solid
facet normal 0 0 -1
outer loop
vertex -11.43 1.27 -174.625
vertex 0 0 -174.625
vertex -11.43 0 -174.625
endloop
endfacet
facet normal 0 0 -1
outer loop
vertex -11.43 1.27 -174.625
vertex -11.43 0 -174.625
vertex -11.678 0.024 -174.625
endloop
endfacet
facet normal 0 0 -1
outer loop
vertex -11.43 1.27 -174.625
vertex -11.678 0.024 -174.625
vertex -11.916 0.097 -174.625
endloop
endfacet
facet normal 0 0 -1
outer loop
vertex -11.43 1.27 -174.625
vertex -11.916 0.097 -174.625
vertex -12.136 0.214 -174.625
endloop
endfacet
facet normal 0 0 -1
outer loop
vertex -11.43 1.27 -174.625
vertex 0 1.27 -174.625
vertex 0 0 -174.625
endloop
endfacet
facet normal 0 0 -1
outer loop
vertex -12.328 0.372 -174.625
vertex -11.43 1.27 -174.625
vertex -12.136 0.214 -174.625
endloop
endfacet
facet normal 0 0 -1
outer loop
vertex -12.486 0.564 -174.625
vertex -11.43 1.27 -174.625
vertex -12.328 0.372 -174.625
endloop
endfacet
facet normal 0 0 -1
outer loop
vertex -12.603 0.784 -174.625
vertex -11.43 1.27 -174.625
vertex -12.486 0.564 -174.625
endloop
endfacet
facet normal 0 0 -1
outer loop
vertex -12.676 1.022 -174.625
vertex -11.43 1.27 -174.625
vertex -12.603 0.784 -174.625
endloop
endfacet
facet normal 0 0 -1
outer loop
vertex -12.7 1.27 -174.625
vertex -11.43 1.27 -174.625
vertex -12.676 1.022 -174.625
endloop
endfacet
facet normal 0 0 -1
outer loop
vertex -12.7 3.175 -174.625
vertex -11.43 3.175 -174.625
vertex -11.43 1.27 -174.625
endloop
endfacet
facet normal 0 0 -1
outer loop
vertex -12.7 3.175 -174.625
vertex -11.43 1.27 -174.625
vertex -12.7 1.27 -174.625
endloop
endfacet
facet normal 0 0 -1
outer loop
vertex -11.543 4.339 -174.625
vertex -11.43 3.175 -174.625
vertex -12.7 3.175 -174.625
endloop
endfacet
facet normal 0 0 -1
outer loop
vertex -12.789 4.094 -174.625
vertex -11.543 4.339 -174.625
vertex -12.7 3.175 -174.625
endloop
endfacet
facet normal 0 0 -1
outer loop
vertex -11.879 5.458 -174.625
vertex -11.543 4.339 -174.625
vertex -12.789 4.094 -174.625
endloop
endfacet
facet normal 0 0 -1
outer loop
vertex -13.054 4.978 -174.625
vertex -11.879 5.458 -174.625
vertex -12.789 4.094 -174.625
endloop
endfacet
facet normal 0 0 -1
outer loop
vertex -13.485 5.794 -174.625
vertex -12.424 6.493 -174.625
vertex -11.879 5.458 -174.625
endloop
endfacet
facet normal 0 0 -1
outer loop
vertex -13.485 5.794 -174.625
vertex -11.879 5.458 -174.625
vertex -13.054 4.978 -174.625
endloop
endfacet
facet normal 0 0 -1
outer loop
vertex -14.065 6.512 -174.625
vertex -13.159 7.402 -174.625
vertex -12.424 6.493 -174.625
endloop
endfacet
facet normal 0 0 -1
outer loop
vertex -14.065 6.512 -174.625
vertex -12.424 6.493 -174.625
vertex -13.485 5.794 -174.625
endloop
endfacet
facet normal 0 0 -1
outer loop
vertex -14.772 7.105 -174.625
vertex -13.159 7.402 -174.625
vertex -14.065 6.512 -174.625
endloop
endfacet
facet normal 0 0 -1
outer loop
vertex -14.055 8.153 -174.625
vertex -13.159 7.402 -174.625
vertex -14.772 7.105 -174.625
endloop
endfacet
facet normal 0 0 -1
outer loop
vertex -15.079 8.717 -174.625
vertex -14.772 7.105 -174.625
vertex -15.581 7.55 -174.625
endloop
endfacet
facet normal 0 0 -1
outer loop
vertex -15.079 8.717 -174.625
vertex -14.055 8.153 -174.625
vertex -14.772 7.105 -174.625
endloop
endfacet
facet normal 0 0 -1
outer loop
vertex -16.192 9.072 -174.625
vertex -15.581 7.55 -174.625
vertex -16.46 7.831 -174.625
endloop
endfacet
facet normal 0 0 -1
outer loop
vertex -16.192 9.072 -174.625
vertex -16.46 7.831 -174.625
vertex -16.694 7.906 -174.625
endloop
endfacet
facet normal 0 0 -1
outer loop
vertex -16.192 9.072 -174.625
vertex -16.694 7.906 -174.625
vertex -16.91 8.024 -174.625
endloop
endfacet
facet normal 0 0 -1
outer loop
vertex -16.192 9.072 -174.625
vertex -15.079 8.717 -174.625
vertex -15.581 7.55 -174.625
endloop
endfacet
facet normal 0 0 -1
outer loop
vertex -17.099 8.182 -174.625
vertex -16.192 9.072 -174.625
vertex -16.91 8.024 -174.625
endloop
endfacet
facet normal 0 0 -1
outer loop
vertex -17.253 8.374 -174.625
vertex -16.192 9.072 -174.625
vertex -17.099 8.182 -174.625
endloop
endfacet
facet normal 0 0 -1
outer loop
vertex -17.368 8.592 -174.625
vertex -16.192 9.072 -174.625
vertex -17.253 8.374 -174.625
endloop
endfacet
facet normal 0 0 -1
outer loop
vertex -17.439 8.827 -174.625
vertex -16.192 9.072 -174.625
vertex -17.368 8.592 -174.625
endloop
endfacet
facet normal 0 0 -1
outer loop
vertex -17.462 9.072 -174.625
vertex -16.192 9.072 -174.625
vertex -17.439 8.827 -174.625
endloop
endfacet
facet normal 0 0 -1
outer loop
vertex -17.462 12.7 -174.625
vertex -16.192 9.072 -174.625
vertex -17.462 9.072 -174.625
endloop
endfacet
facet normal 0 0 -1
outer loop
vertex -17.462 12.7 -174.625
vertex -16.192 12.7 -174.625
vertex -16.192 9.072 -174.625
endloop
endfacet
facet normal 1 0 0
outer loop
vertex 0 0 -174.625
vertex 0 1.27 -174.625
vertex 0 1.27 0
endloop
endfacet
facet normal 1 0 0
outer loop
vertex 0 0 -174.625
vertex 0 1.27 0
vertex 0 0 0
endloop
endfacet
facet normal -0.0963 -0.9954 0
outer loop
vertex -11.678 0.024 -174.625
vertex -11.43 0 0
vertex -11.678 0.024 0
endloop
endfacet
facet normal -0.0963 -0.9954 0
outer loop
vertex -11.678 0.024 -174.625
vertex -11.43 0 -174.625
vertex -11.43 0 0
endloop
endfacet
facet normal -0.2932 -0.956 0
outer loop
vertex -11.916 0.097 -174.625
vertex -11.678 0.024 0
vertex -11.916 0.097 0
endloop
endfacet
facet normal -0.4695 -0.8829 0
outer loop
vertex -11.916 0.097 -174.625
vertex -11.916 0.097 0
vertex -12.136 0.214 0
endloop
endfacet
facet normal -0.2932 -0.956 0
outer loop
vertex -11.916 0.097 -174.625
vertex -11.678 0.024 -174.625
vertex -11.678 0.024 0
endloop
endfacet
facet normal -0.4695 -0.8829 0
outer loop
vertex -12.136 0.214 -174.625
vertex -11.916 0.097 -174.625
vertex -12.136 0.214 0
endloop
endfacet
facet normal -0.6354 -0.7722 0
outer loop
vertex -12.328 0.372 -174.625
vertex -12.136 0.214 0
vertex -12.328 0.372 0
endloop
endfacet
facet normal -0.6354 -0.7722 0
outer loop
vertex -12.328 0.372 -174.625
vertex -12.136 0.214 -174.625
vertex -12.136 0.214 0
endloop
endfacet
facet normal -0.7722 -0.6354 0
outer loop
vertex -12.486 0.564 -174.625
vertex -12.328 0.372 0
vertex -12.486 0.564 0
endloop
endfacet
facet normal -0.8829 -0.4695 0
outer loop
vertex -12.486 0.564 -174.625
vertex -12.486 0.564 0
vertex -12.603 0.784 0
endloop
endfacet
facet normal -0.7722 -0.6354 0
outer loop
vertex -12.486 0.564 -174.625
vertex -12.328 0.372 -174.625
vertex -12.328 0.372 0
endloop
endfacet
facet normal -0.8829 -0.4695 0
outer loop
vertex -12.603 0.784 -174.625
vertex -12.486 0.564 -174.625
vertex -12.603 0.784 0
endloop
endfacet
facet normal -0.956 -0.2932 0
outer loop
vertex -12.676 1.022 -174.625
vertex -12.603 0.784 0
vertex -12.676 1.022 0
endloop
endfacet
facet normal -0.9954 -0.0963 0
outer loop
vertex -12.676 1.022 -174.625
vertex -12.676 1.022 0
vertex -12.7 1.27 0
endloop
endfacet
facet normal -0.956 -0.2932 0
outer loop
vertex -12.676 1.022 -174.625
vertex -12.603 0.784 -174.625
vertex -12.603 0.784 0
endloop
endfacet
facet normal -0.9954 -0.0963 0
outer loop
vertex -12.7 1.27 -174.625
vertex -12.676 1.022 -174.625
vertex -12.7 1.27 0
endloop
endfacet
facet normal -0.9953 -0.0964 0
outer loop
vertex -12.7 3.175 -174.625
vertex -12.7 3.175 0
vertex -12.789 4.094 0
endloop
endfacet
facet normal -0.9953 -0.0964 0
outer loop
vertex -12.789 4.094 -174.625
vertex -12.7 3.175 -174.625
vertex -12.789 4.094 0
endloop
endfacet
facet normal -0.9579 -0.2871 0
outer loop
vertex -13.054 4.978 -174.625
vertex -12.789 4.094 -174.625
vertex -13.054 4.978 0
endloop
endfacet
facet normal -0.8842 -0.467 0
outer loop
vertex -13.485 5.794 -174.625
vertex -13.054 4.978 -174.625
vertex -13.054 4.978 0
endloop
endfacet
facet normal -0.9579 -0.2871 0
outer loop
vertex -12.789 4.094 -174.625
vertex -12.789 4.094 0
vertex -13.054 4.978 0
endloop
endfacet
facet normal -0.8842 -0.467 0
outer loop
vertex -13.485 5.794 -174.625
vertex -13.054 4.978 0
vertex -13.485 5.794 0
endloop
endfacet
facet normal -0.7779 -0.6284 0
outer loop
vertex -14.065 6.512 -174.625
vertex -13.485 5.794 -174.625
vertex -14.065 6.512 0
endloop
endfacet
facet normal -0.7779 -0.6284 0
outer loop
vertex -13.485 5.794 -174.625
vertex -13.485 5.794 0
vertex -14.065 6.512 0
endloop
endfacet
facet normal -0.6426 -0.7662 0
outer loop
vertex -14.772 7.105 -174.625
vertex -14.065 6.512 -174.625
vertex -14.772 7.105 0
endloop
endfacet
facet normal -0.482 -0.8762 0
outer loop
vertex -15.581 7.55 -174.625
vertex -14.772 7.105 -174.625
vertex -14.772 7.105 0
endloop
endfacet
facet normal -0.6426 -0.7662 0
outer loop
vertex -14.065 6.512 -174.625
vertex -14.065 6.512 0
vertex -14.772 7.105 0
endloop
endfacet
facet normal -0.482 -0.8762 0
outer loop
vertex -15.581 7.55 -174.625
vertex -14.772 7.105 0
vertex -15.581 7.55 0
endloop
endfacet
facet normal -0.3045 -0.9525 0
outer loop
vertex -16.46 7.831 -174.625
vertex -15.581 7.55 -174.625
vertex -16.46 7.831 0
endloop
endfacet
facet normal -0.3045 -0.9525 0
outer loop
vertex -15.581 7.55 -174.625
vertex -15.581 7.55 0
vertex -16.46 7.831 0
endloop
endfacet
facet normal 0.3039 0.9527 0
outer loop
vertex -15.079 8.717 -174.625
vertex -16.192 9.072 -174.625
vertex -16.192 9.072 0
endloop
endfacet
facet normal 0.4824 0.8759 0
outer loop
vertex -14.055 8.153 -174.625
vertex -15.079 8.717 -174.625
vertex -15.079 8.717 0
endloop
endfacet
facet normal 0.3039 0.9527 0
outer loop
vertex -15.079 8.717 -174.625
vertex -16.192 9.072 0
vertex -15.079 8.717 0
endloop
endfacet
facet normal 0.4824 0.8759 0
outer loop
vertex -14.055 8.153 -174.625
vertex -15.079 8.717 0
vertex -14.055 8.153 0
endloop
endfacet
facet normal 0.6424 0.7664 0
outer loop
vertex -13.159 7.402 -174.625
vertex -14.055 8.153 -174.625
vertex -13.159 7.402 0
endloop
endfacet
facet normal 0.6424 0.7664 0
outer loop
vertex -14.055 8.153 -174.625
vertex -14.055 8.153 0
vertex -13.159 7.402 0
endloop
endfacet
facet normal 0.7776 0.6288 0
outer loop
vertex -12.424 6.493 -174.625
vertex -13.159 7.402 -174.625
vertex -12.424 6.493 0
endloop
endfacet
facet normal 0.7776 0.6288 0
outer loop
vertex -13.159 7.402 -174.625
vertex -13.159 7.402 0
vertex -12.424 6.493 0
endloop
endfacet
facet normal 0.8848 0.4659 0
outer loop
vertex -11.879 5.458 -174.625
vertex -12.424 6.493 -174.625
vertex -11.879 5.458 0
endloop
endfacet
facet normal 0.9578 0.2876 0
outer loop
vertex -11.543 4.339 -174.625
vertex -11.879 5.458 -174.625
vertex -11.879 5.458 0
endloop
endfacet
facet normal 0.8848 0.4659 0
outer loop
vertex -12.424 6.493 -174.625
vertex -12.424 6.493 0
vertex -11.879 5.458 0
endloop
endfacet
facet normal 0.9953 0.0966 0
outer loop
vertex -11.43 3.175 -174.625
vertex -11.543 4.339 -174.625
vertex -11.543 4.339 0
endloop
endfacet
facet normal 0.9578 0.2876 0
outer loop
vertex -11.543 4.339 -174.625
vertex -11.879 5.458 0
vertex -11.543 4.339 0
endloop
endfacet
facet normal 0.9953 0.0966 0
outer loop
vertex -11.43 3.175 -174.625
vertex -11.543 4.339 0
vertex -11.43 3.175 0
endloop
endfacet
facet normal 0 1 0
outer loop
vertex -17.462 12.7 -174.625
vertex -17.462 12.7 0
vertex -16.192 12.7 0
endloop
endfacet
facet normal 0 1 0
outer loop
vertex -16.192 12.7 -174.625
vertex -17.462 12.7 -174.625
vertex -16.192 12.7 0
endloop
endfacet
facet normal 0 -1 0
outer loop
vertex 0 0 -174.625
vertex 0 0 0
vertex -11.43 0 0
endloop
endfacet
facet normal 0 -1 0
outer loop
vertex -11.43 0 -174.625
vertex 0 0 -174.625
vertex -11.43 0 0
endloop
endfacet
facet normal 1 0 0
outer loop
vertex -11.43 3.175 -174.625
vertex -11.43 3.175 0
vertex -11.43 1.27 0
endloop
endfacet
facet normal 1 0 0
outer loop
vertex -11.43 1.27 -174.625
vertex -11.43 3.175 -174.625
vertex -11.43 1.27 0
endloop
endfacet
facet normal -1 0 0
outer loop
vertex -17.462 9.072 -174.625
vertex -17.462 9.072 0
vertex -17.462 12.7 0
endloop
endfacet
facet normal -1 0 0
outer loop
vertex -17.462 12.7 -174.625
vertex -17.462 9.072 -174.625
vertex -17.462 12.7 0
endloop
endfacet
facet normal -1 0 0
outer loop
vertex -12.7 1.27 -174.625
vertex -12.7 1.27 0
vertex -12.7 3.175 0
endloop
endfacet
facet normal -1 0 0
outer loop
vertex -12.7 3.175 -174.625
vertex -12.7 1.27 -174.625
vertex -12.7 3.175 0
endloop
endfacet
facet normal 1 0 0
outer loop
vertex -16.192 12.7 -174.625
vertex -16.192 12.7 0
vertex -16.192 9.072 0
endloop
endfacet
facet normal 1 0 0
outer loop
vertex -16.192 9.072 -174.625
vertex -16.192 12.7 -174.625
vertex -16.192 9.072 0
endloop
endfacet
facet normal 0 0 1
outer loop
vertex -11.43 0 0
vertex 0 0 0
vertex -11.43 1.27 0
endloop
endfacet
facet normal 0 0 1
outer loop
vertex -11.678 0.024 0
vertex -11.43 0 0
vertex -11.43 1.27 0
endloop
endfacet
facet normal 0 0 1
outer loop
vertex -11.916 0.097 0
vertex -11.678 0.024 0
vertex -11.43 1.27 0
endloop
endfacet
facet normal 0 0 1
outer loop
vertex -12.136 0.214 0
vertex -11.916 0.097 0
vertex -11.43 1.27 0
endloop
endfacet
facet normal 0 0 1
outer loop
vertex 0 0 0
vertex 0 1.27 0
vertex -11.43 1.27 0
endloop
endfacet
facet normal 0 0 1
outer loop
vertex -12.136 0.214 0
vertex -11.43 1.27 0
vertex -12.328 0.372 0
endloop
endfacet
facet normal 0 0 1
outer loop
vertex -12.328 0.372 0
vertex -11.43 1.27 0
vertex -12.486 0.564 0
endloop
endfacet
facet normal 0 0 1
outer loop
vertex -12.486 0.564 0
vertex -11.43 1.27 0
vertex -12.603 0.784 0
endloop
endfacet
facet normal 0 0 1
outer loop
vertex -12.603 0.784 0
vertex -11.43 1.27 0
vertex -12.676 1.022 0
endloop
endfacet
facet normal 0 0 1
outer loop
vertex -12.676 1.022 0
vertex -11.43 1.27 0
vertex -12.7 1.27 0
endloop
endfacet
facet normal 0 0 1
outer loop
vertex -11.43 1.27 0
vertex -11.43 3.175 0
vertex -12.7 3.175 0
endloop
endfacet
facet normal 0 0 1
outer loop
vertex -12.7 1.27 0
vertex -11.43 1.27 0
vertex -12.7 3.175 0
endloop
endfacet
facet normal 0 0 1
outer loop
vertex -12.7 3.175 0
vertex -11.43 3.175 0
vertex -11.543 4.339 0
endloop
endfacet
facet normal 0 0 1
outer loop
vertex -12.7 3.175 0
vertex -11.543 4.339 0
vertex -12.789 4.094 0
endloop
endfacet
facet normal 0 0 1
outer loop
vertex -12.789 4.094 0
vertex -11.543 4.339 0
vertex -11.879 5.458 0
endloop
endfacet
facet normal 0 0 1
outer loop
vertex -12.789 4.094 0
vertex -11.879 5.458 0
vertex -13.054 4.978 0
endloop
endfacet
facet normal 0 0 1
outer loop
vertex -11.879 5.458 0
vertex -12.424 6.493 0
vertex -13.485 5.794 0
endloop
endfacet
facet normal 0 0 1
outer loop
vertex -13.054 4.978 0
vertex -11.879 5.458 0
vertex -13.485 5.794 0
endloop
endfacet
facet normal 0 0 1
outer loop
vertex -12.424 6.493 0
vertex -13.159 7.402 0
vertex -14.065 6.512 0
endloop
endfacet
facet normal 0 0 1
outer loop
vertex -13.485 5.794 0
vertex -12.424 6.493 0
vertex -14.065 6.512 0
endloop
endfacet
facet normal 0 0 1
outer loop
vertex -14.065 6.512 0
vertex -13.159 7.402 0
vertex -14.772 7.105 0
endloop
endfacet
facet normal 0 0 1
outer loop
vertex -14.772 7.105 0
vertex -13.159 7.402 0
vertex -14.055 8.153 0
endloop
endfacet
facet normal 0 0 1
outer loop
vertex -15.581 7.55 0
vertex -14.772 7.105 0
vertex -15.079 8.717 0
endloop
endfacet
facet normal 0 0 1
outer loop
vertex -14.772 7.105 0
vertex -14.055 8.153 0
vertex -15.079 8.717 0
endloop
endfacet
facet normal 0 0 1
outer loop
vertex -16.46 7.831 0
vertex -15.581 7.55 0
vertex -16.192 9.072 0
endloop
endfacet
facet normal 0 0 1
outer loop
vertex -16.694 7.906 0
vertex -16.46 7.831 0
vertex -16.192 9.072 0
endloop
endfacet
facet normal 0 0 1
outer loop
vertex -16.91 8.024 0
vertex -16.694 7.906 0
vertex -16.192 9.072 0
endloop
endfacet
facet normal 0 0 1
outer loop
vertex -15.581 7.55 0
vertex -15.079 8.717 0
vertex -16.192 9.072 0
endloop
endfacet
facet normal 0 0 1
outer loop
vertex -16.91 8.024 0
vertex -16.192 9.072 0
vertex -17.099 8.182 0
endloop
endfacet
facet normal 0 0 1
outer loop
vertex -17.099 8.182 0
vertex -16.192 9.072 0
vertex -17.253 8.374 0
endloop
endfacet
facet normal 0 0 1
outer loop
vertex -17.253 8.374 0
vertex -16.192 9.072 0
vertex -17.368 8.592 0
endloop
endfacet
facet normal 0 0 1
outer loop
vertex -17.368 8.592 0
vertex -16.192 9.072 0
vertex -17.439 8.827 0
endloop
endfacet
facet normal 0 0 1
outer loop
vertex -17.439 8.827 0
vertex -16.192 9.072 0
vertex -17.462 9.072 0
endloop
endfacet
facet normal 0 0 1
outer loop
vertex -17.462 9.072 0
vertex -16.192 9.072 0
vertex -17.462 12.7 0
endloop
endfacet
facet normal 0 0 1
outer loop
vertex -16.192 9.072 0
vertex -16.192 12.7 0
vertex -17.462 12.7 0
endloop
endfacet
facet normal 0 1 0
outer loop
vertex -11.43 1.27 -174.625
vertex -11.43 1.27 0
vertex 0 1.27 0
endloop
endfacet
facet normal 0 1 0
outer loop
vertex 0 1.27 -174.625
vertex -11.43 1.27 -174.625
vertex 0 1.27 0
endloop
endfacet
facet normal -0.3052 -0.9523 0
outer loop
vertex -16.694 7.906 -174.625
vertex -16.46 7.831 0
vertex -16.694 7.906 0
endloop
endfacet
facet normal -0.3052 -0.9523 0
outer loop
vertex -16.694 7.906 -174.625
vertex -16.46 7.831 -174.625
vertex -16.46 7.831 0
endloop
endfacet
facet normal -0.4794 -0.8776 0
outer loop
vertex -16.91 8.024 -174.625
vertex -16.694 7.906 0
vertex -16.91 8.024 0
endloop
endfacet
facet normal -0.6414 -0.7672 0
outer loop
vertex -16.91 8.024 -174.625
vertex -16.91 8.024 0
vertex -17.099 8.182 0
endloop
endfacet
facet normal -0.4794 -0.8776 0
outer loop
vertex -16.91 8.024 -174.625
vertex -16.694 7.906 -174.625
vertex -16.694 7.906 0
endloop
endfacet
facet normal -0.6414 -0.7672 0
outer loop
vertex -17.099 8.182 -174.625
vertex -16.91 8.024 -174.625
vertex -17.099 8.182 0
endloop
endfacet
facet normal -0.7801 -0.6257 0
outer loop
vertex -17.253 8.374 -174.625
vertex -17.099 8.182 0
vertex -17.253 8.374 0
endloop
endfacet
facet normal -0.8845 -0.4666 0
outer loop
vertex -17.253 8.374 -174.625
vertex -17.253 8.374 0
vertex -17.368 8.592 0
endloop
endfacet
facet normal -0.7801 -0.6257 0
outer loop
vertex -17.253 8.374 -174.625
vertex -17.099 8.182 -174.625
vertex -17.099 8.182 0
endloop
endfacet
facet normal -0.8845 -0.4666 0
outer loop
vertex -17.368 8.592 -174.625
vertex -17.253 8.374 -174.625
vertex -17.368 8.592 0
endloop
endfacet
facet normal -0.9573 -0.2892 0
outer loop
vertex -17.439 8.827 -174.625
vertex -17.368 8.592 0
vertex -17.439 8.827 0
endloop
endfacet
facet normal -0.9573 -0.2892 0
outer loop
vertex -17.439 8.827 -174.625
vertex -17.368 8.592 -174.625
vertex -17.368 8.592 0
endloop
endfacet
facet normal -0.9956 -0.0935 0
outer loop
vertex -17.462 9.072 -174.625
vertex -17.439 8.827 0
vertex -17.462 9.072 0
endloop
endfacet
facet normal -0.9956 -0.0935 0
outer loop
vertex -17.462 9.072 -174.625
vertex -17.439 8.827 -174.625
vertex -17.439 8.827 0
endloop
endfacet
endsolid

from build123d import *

# Parameters (mm, degrees)
EXTRUDE_THIN1_DEPTH = 174.625
FILLET1_R           = 1.27


with BuildPart() as part:
    # Sketch1 → Extrude-Thin1 (new body)
    with BuildSketch(Plane.XY):
        with BuildLine():
            Line((0, 0), (-12.7, 0))
            Line((-12.7, 0), (-12.7, 3.175))
            ThreePointArc((-12.7, 3.175), (-14.094903955, 6.542596045), (-17.4625, 7.9375))
            Line((-17.4625, 7.9375), (-17.4625, 12.7))
            Line((-17.4625, 12.7), (-16.1925, 12.7))
            Line((-16.1925, 12.7), (-16.1925, 9.07230076))
            ThreePointArc((-16.1925, 9.07230076), (-12.769295804, 6.965104303), (-11.43, 3.175))
            Line((-11.43, 3.175), (-11.43, 1.27))
            Line((-11.43, 1.27), (0, 1.27))
            Line((0, 1.27), (0, 0))
        make_face()
    extrude(amount=-EXTRUDE_THIN1_DEPTH)

    # Fillet1
    fillet1_edges = [part.edges().sort_by_distance(p)[0] for p in [
        (-12.7, 0, -87.3125),
        (-17.4625, 7.9375, -87.3125),
    ]]
    fillet(fillet1_edges, radius=FILLET1_R)


solid = part.part
